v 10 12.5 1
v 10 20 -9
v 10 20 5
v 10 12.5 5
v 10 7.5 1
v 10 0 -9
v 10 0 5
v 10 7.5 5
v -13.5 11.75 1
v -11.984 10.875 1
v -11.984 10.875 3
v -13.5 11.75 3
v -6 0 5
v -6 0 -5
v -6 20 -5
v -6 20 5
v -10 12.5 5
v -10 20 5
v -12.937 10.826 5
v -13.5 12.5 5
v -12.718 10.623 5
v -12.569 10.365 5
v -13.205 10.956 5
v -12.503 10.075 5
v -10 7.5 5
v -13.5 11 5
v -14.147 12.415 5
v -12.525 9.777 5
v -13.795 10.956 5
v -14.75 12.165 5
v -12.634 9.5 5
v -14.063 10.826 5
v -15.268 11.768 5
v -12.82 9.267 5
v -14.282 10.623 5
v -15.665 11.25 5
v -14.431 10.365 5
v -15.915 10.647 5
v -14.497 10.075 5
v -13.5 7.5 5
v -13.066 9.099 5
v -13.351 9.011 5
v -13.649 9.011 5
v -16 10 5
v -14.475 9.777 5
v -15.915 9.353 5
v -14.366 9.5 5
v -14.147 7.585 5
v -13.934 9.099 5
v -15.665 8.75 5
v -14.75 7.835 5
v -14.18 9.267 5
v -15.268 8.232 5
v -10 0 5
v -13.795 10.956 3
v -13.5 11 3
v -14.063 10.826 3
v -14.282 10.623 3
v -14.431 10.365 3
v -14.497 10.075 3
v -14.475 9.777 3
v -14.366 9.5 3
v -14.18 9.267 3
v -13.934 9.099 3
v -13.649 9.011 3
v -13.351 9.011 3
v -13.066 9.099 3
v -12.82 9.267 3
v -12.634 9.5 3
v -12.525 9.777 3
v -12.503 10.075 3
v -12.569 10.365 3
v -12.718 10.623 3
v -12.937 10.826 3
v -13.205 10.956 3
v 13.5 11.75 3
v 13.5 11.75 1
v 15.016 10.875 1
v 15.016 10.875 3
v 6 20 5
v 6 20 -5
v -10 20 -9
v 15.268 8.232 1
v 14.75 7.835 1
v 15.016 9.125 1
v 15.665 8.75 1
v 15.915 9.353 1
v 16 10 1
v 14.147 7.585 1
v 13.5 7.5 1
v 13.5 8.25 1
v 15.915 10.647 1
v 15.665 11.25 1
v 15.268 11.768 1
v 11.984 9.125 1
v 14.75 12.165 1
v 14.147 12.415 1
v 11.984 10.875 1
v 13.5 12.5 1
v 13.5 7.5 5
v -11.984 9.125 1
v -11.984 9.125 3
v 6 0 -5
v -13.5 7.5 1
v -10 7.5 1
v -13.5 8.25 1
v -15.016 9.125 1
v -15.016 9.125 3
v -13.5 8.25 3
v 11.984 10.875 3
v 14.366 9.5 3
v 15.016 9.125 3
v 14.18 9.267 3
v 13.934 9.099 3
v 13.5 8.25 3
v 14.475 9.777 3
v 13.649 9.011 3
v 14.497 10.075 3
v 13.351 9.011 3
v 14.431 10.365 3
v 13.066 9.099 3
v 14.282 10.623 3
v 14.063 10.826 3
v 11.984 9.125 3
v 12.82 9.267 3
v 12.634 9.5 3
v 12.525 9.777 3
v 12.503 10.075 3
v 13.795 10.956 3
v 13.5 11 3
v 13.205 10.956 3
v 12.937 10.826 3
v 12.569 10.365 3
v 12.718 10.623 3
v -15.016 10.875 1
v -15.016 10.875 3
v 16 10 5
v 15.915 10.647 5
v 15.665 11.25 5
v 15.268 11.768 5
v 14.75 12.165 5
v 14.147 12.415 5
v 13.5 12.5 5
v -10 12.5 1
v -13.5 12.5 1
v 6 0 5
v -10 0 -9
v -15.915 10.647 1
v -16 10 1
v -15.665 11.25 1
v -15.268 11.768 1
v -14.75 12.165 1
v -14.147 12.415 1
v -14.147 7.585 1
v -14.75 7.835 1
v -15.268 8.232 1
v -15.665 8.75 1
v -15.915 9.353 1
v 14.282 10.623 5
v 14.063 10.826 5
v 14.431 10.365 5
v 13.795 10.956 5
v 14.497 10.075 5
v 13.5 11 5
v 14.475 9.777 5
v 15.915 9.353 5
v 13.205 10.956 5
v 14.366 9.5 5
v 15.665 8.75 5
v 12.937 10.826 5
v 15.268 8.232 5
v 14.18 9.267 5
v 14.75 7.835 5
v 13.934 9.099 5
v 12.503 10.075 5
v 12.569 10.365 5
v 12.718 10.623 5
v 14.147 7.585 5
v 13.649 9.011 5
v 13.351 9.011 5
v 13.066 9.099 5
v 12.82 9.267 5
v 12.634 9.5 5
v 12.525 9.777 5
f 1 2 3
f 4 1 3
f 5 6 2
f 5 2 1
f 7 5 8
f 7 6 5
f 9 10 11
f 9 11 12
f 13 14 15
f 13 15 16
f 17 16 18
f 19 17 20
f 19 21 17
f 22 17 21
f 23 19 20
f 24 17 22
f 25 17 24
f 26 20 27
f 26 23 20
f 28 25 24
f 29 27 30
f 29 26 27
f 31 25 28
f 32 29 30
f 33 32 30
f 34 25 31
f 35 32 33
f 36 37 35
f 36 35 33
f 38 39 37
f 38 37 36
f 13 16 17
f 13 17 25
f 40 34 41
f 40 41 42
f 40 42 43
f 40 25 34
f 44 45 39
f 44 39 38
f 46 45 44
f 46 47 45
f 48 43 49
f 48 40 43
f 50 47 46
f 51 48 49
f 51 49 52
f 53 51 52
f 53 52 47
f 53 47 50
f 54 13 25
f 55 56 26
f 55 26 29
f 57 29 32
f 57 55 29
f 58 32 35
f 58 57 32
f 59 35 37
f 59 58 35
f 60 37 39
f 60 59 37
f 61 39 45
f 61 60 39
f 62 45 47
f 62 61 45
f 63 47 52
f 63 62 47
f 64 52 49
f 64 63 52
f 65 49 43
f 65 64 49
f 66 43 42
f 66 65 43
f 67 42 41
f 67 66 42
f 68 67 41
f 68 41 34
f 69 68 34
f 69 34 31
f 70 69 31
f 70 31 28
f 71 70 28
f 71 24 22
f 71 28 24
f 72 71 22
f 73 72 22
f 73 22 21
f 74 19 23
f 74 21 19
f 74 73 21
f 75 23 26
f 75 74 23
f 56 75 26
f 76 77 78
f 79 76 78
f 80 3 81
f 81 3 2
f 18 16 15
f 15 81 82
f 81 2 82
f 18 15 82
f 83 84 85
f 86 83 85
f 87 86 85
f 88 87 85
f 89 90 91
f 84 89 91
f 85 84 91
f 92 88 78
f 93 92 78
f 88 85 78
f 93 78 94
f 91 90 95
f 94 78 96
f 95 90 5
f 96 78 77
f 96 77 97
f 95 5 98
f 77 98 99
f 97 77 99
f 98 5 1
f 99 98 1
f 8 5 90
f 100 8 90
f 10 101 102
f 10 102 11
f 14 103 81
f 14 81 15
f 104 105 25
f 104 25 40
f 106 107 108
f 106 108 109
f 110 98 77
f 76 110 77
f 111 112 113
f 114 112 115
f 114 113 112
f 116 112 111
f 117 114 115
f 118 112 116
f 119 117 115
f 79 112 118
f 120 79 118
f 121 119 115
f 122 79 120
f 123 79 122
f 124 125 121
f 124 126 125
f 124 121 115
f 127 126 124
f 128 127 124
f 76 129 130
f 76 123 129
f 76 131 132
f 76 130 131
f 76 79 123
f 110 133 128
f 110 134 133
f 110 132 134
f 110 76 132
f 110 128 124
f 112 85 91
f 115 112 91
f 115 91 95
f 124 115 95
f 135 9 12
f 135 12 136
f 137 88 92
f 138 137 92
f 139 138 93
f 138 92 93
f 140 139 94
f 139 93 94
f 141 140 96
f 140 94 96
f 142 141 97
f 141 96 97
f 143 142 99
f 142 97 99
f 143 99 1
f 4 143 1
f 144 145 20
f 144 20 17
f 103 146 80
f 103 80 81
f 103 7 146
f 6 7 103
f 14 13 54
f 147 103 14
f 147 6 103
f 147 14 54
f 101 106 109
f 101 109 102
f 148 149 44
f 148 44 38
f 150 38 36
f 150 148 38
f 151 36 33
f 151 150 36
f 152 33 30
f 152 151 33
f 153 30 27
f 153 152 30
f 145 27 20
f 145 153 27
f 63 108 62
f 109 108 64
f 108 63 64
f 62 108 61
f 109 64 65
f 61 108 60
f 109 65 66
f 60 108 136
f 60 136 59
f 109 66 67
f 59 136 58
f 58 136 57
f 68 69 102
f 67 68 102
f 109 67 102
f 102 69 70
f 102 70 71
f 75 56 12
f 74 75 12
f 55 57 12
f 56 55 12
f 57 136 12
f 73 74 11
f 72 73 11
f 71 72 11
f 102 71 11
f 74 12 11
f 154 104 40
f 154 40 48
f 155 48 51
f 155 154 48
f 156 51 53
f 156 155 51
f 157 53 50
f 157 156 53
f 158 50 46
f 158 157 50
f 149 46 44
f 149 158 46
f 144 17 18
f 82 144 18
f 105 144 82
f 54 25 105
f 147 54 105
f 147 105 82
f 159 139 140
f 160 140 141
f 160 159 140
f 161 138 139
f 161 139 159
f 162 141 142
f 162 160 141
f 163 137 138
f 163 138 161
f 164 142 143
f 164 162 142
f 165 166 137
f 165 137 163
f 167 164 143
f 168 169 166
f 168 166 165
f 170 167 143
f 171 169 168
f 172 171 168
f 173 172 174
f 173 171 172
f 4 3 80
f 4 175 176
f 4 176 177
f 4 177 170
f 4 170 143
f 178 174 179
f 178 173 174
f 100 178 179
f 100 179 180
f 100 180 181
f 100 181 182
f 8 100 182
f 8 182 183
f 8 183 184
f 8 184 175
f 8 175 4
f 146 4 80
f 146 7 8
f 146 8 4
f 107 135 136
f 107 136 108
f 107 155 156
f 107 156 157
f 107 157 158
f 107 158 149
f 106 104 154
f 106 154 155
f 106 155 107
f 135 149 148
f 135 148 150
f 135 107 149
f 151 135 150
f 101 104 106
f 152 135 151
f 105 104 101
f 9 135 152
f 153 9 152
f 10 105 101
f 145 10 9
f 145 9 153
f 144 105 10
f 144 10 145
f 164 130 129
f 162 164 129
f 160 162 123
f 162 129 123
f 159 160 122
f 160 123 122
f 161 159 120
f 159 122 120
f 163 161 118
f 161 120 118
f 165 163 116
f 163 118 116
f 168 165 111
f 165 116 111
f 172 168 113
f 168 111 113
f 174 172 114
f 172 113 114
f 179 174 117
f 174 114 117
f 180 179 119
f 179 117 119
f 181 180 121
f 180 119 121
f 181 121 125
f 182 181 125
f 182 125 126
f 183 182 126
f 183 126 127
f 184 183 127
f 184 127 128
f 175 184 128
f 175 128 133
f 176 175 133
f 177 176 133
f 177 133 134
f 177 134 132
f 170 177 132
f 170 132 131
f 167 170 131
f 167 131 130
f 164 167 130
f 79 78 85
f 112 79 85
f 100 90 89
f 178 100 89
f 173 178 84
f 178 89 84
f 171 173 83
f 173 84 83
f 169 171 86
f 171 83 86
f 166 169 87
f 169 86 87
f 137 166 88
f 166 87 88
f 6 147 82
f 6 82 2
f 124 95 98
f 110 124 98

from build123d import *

# Parameters (mm, degrees)
BOSS_EXTRUDE1_DEPTH = 20
SKETCH2_W           = 4
SKETCH2_H           = 12
BOSS_EXTRUDE2_DEPTH = 6
SKETCH3_R           = 1
CUT_EXTRUDE1_DEPTH  = 6
CUT_EXTRUDE2_DEPTH  = 2


with BuildPart() as part:
    # Sketch1 → Boss-Extrude1 (new body)
    with BuildSketch(Plane(origin=(0, 0, 0), x_dir=(1, 0, 0), z_dir=(0, 1, 0))):
        Polygon((-6, -5), (-10, -5), (-10, 9), (10, 9), (10, -5), (6, -5), (6, 5), (-6, 5), align=None)
    extrude(amount=BOSS_EXTRUDE1_DEPTH)

    # Sketch2 → Boss-Extrude2 (add)
    with BuildSketch(Plane(origin=(10, 0, 0), x_dir=(0, 0, -1), z_dir=(1, 0, 0))):
        with Locations((-3, 10)):
            Rectangle(SKETCH2_W, SKETCH2_H)
    boss_extrude2 = extrude(amount=BOSS_EXTRUDE2_DEPTH)

    # Sketch3 → Cut-Extrude1 (cut)
    with BuildSketch(Plane(origin=(0, 0, 1), x_dir=(-1, 0, 0), z_dir=(0, 0, -1))):
        with BuildLine():
            Line((-16, 4), (-10, 4))
            Line((-10, 4), (-10, 7.5))
            Line((-10, 7.5), (-13.5, 7.5))
            ThreePointArc((-13.5, 7.5), (-15.267766953, 8.232233047), (-16, 10))
            Line((-16, 10), (-16, 4))
        make_face()
        with Locations(Location((-13.5, 10, 0), (0, 0, 90))):
            Circle(SKETCH3_R)
        with BuildLine():
            Line((-16, 16), (-16, 10))
            ThreePointArc((-16, 10), (-15.267766953, 11.767766953), (-13.5, 12.5))
            Line((-13.5, 12.5), (-10, 12.5))
            Line((-10, 12.5), (-10, 16))
            Line((-10, 16), (-16, 16))
        make_face()
    cut_extrude1 = extrude(amount=-CUT_EXTRUDE1_DEPTH, mode=Mode.SUBTRACT)

    # Sketch4 → Cut-Extrude2 (cut)
    with BuildSketch(Plane(origin=(0, 0, 1), x_dir=(-1, 0, 0), z_dir=(0, 0, -1))):
        Polygon((-13.5, 11.75), (-15.015544457, 10.875), (-15.015544457, 9.125), (-13.5, 8.25), (-11.984455543, 9.125), (-11.984455543, 10.875), align=None)
    cut_extrude2 = extrude(amount=-CUT_EXTRUDE2_DEPTH, mode=Mode.SUBTRACT)

    # Mirror1: Boss-Extrude2, Cut-Extrude1, Cut-Extrude2 across plane
    add(boss_extrude2.mirror(Plane(origin=(0, 0, 0), x_dir=(0, 0, 1), z_dir=(1, 0, 0))))
    add(cut_extrude1.mirror(Plane(origin=(0, 0, 0), x_dir=(0, 0, 1), z_dir=(1, 0, 0))), mode=Mode.SUBTRACT)
    add(cut_extrude2.mirror(Plane(origin=(0, 0, 0), x_dir=(0, 0, 1), z_dir=(1, 0, 0))), mode=Mode.SUBTRACT)


solid = part.part
